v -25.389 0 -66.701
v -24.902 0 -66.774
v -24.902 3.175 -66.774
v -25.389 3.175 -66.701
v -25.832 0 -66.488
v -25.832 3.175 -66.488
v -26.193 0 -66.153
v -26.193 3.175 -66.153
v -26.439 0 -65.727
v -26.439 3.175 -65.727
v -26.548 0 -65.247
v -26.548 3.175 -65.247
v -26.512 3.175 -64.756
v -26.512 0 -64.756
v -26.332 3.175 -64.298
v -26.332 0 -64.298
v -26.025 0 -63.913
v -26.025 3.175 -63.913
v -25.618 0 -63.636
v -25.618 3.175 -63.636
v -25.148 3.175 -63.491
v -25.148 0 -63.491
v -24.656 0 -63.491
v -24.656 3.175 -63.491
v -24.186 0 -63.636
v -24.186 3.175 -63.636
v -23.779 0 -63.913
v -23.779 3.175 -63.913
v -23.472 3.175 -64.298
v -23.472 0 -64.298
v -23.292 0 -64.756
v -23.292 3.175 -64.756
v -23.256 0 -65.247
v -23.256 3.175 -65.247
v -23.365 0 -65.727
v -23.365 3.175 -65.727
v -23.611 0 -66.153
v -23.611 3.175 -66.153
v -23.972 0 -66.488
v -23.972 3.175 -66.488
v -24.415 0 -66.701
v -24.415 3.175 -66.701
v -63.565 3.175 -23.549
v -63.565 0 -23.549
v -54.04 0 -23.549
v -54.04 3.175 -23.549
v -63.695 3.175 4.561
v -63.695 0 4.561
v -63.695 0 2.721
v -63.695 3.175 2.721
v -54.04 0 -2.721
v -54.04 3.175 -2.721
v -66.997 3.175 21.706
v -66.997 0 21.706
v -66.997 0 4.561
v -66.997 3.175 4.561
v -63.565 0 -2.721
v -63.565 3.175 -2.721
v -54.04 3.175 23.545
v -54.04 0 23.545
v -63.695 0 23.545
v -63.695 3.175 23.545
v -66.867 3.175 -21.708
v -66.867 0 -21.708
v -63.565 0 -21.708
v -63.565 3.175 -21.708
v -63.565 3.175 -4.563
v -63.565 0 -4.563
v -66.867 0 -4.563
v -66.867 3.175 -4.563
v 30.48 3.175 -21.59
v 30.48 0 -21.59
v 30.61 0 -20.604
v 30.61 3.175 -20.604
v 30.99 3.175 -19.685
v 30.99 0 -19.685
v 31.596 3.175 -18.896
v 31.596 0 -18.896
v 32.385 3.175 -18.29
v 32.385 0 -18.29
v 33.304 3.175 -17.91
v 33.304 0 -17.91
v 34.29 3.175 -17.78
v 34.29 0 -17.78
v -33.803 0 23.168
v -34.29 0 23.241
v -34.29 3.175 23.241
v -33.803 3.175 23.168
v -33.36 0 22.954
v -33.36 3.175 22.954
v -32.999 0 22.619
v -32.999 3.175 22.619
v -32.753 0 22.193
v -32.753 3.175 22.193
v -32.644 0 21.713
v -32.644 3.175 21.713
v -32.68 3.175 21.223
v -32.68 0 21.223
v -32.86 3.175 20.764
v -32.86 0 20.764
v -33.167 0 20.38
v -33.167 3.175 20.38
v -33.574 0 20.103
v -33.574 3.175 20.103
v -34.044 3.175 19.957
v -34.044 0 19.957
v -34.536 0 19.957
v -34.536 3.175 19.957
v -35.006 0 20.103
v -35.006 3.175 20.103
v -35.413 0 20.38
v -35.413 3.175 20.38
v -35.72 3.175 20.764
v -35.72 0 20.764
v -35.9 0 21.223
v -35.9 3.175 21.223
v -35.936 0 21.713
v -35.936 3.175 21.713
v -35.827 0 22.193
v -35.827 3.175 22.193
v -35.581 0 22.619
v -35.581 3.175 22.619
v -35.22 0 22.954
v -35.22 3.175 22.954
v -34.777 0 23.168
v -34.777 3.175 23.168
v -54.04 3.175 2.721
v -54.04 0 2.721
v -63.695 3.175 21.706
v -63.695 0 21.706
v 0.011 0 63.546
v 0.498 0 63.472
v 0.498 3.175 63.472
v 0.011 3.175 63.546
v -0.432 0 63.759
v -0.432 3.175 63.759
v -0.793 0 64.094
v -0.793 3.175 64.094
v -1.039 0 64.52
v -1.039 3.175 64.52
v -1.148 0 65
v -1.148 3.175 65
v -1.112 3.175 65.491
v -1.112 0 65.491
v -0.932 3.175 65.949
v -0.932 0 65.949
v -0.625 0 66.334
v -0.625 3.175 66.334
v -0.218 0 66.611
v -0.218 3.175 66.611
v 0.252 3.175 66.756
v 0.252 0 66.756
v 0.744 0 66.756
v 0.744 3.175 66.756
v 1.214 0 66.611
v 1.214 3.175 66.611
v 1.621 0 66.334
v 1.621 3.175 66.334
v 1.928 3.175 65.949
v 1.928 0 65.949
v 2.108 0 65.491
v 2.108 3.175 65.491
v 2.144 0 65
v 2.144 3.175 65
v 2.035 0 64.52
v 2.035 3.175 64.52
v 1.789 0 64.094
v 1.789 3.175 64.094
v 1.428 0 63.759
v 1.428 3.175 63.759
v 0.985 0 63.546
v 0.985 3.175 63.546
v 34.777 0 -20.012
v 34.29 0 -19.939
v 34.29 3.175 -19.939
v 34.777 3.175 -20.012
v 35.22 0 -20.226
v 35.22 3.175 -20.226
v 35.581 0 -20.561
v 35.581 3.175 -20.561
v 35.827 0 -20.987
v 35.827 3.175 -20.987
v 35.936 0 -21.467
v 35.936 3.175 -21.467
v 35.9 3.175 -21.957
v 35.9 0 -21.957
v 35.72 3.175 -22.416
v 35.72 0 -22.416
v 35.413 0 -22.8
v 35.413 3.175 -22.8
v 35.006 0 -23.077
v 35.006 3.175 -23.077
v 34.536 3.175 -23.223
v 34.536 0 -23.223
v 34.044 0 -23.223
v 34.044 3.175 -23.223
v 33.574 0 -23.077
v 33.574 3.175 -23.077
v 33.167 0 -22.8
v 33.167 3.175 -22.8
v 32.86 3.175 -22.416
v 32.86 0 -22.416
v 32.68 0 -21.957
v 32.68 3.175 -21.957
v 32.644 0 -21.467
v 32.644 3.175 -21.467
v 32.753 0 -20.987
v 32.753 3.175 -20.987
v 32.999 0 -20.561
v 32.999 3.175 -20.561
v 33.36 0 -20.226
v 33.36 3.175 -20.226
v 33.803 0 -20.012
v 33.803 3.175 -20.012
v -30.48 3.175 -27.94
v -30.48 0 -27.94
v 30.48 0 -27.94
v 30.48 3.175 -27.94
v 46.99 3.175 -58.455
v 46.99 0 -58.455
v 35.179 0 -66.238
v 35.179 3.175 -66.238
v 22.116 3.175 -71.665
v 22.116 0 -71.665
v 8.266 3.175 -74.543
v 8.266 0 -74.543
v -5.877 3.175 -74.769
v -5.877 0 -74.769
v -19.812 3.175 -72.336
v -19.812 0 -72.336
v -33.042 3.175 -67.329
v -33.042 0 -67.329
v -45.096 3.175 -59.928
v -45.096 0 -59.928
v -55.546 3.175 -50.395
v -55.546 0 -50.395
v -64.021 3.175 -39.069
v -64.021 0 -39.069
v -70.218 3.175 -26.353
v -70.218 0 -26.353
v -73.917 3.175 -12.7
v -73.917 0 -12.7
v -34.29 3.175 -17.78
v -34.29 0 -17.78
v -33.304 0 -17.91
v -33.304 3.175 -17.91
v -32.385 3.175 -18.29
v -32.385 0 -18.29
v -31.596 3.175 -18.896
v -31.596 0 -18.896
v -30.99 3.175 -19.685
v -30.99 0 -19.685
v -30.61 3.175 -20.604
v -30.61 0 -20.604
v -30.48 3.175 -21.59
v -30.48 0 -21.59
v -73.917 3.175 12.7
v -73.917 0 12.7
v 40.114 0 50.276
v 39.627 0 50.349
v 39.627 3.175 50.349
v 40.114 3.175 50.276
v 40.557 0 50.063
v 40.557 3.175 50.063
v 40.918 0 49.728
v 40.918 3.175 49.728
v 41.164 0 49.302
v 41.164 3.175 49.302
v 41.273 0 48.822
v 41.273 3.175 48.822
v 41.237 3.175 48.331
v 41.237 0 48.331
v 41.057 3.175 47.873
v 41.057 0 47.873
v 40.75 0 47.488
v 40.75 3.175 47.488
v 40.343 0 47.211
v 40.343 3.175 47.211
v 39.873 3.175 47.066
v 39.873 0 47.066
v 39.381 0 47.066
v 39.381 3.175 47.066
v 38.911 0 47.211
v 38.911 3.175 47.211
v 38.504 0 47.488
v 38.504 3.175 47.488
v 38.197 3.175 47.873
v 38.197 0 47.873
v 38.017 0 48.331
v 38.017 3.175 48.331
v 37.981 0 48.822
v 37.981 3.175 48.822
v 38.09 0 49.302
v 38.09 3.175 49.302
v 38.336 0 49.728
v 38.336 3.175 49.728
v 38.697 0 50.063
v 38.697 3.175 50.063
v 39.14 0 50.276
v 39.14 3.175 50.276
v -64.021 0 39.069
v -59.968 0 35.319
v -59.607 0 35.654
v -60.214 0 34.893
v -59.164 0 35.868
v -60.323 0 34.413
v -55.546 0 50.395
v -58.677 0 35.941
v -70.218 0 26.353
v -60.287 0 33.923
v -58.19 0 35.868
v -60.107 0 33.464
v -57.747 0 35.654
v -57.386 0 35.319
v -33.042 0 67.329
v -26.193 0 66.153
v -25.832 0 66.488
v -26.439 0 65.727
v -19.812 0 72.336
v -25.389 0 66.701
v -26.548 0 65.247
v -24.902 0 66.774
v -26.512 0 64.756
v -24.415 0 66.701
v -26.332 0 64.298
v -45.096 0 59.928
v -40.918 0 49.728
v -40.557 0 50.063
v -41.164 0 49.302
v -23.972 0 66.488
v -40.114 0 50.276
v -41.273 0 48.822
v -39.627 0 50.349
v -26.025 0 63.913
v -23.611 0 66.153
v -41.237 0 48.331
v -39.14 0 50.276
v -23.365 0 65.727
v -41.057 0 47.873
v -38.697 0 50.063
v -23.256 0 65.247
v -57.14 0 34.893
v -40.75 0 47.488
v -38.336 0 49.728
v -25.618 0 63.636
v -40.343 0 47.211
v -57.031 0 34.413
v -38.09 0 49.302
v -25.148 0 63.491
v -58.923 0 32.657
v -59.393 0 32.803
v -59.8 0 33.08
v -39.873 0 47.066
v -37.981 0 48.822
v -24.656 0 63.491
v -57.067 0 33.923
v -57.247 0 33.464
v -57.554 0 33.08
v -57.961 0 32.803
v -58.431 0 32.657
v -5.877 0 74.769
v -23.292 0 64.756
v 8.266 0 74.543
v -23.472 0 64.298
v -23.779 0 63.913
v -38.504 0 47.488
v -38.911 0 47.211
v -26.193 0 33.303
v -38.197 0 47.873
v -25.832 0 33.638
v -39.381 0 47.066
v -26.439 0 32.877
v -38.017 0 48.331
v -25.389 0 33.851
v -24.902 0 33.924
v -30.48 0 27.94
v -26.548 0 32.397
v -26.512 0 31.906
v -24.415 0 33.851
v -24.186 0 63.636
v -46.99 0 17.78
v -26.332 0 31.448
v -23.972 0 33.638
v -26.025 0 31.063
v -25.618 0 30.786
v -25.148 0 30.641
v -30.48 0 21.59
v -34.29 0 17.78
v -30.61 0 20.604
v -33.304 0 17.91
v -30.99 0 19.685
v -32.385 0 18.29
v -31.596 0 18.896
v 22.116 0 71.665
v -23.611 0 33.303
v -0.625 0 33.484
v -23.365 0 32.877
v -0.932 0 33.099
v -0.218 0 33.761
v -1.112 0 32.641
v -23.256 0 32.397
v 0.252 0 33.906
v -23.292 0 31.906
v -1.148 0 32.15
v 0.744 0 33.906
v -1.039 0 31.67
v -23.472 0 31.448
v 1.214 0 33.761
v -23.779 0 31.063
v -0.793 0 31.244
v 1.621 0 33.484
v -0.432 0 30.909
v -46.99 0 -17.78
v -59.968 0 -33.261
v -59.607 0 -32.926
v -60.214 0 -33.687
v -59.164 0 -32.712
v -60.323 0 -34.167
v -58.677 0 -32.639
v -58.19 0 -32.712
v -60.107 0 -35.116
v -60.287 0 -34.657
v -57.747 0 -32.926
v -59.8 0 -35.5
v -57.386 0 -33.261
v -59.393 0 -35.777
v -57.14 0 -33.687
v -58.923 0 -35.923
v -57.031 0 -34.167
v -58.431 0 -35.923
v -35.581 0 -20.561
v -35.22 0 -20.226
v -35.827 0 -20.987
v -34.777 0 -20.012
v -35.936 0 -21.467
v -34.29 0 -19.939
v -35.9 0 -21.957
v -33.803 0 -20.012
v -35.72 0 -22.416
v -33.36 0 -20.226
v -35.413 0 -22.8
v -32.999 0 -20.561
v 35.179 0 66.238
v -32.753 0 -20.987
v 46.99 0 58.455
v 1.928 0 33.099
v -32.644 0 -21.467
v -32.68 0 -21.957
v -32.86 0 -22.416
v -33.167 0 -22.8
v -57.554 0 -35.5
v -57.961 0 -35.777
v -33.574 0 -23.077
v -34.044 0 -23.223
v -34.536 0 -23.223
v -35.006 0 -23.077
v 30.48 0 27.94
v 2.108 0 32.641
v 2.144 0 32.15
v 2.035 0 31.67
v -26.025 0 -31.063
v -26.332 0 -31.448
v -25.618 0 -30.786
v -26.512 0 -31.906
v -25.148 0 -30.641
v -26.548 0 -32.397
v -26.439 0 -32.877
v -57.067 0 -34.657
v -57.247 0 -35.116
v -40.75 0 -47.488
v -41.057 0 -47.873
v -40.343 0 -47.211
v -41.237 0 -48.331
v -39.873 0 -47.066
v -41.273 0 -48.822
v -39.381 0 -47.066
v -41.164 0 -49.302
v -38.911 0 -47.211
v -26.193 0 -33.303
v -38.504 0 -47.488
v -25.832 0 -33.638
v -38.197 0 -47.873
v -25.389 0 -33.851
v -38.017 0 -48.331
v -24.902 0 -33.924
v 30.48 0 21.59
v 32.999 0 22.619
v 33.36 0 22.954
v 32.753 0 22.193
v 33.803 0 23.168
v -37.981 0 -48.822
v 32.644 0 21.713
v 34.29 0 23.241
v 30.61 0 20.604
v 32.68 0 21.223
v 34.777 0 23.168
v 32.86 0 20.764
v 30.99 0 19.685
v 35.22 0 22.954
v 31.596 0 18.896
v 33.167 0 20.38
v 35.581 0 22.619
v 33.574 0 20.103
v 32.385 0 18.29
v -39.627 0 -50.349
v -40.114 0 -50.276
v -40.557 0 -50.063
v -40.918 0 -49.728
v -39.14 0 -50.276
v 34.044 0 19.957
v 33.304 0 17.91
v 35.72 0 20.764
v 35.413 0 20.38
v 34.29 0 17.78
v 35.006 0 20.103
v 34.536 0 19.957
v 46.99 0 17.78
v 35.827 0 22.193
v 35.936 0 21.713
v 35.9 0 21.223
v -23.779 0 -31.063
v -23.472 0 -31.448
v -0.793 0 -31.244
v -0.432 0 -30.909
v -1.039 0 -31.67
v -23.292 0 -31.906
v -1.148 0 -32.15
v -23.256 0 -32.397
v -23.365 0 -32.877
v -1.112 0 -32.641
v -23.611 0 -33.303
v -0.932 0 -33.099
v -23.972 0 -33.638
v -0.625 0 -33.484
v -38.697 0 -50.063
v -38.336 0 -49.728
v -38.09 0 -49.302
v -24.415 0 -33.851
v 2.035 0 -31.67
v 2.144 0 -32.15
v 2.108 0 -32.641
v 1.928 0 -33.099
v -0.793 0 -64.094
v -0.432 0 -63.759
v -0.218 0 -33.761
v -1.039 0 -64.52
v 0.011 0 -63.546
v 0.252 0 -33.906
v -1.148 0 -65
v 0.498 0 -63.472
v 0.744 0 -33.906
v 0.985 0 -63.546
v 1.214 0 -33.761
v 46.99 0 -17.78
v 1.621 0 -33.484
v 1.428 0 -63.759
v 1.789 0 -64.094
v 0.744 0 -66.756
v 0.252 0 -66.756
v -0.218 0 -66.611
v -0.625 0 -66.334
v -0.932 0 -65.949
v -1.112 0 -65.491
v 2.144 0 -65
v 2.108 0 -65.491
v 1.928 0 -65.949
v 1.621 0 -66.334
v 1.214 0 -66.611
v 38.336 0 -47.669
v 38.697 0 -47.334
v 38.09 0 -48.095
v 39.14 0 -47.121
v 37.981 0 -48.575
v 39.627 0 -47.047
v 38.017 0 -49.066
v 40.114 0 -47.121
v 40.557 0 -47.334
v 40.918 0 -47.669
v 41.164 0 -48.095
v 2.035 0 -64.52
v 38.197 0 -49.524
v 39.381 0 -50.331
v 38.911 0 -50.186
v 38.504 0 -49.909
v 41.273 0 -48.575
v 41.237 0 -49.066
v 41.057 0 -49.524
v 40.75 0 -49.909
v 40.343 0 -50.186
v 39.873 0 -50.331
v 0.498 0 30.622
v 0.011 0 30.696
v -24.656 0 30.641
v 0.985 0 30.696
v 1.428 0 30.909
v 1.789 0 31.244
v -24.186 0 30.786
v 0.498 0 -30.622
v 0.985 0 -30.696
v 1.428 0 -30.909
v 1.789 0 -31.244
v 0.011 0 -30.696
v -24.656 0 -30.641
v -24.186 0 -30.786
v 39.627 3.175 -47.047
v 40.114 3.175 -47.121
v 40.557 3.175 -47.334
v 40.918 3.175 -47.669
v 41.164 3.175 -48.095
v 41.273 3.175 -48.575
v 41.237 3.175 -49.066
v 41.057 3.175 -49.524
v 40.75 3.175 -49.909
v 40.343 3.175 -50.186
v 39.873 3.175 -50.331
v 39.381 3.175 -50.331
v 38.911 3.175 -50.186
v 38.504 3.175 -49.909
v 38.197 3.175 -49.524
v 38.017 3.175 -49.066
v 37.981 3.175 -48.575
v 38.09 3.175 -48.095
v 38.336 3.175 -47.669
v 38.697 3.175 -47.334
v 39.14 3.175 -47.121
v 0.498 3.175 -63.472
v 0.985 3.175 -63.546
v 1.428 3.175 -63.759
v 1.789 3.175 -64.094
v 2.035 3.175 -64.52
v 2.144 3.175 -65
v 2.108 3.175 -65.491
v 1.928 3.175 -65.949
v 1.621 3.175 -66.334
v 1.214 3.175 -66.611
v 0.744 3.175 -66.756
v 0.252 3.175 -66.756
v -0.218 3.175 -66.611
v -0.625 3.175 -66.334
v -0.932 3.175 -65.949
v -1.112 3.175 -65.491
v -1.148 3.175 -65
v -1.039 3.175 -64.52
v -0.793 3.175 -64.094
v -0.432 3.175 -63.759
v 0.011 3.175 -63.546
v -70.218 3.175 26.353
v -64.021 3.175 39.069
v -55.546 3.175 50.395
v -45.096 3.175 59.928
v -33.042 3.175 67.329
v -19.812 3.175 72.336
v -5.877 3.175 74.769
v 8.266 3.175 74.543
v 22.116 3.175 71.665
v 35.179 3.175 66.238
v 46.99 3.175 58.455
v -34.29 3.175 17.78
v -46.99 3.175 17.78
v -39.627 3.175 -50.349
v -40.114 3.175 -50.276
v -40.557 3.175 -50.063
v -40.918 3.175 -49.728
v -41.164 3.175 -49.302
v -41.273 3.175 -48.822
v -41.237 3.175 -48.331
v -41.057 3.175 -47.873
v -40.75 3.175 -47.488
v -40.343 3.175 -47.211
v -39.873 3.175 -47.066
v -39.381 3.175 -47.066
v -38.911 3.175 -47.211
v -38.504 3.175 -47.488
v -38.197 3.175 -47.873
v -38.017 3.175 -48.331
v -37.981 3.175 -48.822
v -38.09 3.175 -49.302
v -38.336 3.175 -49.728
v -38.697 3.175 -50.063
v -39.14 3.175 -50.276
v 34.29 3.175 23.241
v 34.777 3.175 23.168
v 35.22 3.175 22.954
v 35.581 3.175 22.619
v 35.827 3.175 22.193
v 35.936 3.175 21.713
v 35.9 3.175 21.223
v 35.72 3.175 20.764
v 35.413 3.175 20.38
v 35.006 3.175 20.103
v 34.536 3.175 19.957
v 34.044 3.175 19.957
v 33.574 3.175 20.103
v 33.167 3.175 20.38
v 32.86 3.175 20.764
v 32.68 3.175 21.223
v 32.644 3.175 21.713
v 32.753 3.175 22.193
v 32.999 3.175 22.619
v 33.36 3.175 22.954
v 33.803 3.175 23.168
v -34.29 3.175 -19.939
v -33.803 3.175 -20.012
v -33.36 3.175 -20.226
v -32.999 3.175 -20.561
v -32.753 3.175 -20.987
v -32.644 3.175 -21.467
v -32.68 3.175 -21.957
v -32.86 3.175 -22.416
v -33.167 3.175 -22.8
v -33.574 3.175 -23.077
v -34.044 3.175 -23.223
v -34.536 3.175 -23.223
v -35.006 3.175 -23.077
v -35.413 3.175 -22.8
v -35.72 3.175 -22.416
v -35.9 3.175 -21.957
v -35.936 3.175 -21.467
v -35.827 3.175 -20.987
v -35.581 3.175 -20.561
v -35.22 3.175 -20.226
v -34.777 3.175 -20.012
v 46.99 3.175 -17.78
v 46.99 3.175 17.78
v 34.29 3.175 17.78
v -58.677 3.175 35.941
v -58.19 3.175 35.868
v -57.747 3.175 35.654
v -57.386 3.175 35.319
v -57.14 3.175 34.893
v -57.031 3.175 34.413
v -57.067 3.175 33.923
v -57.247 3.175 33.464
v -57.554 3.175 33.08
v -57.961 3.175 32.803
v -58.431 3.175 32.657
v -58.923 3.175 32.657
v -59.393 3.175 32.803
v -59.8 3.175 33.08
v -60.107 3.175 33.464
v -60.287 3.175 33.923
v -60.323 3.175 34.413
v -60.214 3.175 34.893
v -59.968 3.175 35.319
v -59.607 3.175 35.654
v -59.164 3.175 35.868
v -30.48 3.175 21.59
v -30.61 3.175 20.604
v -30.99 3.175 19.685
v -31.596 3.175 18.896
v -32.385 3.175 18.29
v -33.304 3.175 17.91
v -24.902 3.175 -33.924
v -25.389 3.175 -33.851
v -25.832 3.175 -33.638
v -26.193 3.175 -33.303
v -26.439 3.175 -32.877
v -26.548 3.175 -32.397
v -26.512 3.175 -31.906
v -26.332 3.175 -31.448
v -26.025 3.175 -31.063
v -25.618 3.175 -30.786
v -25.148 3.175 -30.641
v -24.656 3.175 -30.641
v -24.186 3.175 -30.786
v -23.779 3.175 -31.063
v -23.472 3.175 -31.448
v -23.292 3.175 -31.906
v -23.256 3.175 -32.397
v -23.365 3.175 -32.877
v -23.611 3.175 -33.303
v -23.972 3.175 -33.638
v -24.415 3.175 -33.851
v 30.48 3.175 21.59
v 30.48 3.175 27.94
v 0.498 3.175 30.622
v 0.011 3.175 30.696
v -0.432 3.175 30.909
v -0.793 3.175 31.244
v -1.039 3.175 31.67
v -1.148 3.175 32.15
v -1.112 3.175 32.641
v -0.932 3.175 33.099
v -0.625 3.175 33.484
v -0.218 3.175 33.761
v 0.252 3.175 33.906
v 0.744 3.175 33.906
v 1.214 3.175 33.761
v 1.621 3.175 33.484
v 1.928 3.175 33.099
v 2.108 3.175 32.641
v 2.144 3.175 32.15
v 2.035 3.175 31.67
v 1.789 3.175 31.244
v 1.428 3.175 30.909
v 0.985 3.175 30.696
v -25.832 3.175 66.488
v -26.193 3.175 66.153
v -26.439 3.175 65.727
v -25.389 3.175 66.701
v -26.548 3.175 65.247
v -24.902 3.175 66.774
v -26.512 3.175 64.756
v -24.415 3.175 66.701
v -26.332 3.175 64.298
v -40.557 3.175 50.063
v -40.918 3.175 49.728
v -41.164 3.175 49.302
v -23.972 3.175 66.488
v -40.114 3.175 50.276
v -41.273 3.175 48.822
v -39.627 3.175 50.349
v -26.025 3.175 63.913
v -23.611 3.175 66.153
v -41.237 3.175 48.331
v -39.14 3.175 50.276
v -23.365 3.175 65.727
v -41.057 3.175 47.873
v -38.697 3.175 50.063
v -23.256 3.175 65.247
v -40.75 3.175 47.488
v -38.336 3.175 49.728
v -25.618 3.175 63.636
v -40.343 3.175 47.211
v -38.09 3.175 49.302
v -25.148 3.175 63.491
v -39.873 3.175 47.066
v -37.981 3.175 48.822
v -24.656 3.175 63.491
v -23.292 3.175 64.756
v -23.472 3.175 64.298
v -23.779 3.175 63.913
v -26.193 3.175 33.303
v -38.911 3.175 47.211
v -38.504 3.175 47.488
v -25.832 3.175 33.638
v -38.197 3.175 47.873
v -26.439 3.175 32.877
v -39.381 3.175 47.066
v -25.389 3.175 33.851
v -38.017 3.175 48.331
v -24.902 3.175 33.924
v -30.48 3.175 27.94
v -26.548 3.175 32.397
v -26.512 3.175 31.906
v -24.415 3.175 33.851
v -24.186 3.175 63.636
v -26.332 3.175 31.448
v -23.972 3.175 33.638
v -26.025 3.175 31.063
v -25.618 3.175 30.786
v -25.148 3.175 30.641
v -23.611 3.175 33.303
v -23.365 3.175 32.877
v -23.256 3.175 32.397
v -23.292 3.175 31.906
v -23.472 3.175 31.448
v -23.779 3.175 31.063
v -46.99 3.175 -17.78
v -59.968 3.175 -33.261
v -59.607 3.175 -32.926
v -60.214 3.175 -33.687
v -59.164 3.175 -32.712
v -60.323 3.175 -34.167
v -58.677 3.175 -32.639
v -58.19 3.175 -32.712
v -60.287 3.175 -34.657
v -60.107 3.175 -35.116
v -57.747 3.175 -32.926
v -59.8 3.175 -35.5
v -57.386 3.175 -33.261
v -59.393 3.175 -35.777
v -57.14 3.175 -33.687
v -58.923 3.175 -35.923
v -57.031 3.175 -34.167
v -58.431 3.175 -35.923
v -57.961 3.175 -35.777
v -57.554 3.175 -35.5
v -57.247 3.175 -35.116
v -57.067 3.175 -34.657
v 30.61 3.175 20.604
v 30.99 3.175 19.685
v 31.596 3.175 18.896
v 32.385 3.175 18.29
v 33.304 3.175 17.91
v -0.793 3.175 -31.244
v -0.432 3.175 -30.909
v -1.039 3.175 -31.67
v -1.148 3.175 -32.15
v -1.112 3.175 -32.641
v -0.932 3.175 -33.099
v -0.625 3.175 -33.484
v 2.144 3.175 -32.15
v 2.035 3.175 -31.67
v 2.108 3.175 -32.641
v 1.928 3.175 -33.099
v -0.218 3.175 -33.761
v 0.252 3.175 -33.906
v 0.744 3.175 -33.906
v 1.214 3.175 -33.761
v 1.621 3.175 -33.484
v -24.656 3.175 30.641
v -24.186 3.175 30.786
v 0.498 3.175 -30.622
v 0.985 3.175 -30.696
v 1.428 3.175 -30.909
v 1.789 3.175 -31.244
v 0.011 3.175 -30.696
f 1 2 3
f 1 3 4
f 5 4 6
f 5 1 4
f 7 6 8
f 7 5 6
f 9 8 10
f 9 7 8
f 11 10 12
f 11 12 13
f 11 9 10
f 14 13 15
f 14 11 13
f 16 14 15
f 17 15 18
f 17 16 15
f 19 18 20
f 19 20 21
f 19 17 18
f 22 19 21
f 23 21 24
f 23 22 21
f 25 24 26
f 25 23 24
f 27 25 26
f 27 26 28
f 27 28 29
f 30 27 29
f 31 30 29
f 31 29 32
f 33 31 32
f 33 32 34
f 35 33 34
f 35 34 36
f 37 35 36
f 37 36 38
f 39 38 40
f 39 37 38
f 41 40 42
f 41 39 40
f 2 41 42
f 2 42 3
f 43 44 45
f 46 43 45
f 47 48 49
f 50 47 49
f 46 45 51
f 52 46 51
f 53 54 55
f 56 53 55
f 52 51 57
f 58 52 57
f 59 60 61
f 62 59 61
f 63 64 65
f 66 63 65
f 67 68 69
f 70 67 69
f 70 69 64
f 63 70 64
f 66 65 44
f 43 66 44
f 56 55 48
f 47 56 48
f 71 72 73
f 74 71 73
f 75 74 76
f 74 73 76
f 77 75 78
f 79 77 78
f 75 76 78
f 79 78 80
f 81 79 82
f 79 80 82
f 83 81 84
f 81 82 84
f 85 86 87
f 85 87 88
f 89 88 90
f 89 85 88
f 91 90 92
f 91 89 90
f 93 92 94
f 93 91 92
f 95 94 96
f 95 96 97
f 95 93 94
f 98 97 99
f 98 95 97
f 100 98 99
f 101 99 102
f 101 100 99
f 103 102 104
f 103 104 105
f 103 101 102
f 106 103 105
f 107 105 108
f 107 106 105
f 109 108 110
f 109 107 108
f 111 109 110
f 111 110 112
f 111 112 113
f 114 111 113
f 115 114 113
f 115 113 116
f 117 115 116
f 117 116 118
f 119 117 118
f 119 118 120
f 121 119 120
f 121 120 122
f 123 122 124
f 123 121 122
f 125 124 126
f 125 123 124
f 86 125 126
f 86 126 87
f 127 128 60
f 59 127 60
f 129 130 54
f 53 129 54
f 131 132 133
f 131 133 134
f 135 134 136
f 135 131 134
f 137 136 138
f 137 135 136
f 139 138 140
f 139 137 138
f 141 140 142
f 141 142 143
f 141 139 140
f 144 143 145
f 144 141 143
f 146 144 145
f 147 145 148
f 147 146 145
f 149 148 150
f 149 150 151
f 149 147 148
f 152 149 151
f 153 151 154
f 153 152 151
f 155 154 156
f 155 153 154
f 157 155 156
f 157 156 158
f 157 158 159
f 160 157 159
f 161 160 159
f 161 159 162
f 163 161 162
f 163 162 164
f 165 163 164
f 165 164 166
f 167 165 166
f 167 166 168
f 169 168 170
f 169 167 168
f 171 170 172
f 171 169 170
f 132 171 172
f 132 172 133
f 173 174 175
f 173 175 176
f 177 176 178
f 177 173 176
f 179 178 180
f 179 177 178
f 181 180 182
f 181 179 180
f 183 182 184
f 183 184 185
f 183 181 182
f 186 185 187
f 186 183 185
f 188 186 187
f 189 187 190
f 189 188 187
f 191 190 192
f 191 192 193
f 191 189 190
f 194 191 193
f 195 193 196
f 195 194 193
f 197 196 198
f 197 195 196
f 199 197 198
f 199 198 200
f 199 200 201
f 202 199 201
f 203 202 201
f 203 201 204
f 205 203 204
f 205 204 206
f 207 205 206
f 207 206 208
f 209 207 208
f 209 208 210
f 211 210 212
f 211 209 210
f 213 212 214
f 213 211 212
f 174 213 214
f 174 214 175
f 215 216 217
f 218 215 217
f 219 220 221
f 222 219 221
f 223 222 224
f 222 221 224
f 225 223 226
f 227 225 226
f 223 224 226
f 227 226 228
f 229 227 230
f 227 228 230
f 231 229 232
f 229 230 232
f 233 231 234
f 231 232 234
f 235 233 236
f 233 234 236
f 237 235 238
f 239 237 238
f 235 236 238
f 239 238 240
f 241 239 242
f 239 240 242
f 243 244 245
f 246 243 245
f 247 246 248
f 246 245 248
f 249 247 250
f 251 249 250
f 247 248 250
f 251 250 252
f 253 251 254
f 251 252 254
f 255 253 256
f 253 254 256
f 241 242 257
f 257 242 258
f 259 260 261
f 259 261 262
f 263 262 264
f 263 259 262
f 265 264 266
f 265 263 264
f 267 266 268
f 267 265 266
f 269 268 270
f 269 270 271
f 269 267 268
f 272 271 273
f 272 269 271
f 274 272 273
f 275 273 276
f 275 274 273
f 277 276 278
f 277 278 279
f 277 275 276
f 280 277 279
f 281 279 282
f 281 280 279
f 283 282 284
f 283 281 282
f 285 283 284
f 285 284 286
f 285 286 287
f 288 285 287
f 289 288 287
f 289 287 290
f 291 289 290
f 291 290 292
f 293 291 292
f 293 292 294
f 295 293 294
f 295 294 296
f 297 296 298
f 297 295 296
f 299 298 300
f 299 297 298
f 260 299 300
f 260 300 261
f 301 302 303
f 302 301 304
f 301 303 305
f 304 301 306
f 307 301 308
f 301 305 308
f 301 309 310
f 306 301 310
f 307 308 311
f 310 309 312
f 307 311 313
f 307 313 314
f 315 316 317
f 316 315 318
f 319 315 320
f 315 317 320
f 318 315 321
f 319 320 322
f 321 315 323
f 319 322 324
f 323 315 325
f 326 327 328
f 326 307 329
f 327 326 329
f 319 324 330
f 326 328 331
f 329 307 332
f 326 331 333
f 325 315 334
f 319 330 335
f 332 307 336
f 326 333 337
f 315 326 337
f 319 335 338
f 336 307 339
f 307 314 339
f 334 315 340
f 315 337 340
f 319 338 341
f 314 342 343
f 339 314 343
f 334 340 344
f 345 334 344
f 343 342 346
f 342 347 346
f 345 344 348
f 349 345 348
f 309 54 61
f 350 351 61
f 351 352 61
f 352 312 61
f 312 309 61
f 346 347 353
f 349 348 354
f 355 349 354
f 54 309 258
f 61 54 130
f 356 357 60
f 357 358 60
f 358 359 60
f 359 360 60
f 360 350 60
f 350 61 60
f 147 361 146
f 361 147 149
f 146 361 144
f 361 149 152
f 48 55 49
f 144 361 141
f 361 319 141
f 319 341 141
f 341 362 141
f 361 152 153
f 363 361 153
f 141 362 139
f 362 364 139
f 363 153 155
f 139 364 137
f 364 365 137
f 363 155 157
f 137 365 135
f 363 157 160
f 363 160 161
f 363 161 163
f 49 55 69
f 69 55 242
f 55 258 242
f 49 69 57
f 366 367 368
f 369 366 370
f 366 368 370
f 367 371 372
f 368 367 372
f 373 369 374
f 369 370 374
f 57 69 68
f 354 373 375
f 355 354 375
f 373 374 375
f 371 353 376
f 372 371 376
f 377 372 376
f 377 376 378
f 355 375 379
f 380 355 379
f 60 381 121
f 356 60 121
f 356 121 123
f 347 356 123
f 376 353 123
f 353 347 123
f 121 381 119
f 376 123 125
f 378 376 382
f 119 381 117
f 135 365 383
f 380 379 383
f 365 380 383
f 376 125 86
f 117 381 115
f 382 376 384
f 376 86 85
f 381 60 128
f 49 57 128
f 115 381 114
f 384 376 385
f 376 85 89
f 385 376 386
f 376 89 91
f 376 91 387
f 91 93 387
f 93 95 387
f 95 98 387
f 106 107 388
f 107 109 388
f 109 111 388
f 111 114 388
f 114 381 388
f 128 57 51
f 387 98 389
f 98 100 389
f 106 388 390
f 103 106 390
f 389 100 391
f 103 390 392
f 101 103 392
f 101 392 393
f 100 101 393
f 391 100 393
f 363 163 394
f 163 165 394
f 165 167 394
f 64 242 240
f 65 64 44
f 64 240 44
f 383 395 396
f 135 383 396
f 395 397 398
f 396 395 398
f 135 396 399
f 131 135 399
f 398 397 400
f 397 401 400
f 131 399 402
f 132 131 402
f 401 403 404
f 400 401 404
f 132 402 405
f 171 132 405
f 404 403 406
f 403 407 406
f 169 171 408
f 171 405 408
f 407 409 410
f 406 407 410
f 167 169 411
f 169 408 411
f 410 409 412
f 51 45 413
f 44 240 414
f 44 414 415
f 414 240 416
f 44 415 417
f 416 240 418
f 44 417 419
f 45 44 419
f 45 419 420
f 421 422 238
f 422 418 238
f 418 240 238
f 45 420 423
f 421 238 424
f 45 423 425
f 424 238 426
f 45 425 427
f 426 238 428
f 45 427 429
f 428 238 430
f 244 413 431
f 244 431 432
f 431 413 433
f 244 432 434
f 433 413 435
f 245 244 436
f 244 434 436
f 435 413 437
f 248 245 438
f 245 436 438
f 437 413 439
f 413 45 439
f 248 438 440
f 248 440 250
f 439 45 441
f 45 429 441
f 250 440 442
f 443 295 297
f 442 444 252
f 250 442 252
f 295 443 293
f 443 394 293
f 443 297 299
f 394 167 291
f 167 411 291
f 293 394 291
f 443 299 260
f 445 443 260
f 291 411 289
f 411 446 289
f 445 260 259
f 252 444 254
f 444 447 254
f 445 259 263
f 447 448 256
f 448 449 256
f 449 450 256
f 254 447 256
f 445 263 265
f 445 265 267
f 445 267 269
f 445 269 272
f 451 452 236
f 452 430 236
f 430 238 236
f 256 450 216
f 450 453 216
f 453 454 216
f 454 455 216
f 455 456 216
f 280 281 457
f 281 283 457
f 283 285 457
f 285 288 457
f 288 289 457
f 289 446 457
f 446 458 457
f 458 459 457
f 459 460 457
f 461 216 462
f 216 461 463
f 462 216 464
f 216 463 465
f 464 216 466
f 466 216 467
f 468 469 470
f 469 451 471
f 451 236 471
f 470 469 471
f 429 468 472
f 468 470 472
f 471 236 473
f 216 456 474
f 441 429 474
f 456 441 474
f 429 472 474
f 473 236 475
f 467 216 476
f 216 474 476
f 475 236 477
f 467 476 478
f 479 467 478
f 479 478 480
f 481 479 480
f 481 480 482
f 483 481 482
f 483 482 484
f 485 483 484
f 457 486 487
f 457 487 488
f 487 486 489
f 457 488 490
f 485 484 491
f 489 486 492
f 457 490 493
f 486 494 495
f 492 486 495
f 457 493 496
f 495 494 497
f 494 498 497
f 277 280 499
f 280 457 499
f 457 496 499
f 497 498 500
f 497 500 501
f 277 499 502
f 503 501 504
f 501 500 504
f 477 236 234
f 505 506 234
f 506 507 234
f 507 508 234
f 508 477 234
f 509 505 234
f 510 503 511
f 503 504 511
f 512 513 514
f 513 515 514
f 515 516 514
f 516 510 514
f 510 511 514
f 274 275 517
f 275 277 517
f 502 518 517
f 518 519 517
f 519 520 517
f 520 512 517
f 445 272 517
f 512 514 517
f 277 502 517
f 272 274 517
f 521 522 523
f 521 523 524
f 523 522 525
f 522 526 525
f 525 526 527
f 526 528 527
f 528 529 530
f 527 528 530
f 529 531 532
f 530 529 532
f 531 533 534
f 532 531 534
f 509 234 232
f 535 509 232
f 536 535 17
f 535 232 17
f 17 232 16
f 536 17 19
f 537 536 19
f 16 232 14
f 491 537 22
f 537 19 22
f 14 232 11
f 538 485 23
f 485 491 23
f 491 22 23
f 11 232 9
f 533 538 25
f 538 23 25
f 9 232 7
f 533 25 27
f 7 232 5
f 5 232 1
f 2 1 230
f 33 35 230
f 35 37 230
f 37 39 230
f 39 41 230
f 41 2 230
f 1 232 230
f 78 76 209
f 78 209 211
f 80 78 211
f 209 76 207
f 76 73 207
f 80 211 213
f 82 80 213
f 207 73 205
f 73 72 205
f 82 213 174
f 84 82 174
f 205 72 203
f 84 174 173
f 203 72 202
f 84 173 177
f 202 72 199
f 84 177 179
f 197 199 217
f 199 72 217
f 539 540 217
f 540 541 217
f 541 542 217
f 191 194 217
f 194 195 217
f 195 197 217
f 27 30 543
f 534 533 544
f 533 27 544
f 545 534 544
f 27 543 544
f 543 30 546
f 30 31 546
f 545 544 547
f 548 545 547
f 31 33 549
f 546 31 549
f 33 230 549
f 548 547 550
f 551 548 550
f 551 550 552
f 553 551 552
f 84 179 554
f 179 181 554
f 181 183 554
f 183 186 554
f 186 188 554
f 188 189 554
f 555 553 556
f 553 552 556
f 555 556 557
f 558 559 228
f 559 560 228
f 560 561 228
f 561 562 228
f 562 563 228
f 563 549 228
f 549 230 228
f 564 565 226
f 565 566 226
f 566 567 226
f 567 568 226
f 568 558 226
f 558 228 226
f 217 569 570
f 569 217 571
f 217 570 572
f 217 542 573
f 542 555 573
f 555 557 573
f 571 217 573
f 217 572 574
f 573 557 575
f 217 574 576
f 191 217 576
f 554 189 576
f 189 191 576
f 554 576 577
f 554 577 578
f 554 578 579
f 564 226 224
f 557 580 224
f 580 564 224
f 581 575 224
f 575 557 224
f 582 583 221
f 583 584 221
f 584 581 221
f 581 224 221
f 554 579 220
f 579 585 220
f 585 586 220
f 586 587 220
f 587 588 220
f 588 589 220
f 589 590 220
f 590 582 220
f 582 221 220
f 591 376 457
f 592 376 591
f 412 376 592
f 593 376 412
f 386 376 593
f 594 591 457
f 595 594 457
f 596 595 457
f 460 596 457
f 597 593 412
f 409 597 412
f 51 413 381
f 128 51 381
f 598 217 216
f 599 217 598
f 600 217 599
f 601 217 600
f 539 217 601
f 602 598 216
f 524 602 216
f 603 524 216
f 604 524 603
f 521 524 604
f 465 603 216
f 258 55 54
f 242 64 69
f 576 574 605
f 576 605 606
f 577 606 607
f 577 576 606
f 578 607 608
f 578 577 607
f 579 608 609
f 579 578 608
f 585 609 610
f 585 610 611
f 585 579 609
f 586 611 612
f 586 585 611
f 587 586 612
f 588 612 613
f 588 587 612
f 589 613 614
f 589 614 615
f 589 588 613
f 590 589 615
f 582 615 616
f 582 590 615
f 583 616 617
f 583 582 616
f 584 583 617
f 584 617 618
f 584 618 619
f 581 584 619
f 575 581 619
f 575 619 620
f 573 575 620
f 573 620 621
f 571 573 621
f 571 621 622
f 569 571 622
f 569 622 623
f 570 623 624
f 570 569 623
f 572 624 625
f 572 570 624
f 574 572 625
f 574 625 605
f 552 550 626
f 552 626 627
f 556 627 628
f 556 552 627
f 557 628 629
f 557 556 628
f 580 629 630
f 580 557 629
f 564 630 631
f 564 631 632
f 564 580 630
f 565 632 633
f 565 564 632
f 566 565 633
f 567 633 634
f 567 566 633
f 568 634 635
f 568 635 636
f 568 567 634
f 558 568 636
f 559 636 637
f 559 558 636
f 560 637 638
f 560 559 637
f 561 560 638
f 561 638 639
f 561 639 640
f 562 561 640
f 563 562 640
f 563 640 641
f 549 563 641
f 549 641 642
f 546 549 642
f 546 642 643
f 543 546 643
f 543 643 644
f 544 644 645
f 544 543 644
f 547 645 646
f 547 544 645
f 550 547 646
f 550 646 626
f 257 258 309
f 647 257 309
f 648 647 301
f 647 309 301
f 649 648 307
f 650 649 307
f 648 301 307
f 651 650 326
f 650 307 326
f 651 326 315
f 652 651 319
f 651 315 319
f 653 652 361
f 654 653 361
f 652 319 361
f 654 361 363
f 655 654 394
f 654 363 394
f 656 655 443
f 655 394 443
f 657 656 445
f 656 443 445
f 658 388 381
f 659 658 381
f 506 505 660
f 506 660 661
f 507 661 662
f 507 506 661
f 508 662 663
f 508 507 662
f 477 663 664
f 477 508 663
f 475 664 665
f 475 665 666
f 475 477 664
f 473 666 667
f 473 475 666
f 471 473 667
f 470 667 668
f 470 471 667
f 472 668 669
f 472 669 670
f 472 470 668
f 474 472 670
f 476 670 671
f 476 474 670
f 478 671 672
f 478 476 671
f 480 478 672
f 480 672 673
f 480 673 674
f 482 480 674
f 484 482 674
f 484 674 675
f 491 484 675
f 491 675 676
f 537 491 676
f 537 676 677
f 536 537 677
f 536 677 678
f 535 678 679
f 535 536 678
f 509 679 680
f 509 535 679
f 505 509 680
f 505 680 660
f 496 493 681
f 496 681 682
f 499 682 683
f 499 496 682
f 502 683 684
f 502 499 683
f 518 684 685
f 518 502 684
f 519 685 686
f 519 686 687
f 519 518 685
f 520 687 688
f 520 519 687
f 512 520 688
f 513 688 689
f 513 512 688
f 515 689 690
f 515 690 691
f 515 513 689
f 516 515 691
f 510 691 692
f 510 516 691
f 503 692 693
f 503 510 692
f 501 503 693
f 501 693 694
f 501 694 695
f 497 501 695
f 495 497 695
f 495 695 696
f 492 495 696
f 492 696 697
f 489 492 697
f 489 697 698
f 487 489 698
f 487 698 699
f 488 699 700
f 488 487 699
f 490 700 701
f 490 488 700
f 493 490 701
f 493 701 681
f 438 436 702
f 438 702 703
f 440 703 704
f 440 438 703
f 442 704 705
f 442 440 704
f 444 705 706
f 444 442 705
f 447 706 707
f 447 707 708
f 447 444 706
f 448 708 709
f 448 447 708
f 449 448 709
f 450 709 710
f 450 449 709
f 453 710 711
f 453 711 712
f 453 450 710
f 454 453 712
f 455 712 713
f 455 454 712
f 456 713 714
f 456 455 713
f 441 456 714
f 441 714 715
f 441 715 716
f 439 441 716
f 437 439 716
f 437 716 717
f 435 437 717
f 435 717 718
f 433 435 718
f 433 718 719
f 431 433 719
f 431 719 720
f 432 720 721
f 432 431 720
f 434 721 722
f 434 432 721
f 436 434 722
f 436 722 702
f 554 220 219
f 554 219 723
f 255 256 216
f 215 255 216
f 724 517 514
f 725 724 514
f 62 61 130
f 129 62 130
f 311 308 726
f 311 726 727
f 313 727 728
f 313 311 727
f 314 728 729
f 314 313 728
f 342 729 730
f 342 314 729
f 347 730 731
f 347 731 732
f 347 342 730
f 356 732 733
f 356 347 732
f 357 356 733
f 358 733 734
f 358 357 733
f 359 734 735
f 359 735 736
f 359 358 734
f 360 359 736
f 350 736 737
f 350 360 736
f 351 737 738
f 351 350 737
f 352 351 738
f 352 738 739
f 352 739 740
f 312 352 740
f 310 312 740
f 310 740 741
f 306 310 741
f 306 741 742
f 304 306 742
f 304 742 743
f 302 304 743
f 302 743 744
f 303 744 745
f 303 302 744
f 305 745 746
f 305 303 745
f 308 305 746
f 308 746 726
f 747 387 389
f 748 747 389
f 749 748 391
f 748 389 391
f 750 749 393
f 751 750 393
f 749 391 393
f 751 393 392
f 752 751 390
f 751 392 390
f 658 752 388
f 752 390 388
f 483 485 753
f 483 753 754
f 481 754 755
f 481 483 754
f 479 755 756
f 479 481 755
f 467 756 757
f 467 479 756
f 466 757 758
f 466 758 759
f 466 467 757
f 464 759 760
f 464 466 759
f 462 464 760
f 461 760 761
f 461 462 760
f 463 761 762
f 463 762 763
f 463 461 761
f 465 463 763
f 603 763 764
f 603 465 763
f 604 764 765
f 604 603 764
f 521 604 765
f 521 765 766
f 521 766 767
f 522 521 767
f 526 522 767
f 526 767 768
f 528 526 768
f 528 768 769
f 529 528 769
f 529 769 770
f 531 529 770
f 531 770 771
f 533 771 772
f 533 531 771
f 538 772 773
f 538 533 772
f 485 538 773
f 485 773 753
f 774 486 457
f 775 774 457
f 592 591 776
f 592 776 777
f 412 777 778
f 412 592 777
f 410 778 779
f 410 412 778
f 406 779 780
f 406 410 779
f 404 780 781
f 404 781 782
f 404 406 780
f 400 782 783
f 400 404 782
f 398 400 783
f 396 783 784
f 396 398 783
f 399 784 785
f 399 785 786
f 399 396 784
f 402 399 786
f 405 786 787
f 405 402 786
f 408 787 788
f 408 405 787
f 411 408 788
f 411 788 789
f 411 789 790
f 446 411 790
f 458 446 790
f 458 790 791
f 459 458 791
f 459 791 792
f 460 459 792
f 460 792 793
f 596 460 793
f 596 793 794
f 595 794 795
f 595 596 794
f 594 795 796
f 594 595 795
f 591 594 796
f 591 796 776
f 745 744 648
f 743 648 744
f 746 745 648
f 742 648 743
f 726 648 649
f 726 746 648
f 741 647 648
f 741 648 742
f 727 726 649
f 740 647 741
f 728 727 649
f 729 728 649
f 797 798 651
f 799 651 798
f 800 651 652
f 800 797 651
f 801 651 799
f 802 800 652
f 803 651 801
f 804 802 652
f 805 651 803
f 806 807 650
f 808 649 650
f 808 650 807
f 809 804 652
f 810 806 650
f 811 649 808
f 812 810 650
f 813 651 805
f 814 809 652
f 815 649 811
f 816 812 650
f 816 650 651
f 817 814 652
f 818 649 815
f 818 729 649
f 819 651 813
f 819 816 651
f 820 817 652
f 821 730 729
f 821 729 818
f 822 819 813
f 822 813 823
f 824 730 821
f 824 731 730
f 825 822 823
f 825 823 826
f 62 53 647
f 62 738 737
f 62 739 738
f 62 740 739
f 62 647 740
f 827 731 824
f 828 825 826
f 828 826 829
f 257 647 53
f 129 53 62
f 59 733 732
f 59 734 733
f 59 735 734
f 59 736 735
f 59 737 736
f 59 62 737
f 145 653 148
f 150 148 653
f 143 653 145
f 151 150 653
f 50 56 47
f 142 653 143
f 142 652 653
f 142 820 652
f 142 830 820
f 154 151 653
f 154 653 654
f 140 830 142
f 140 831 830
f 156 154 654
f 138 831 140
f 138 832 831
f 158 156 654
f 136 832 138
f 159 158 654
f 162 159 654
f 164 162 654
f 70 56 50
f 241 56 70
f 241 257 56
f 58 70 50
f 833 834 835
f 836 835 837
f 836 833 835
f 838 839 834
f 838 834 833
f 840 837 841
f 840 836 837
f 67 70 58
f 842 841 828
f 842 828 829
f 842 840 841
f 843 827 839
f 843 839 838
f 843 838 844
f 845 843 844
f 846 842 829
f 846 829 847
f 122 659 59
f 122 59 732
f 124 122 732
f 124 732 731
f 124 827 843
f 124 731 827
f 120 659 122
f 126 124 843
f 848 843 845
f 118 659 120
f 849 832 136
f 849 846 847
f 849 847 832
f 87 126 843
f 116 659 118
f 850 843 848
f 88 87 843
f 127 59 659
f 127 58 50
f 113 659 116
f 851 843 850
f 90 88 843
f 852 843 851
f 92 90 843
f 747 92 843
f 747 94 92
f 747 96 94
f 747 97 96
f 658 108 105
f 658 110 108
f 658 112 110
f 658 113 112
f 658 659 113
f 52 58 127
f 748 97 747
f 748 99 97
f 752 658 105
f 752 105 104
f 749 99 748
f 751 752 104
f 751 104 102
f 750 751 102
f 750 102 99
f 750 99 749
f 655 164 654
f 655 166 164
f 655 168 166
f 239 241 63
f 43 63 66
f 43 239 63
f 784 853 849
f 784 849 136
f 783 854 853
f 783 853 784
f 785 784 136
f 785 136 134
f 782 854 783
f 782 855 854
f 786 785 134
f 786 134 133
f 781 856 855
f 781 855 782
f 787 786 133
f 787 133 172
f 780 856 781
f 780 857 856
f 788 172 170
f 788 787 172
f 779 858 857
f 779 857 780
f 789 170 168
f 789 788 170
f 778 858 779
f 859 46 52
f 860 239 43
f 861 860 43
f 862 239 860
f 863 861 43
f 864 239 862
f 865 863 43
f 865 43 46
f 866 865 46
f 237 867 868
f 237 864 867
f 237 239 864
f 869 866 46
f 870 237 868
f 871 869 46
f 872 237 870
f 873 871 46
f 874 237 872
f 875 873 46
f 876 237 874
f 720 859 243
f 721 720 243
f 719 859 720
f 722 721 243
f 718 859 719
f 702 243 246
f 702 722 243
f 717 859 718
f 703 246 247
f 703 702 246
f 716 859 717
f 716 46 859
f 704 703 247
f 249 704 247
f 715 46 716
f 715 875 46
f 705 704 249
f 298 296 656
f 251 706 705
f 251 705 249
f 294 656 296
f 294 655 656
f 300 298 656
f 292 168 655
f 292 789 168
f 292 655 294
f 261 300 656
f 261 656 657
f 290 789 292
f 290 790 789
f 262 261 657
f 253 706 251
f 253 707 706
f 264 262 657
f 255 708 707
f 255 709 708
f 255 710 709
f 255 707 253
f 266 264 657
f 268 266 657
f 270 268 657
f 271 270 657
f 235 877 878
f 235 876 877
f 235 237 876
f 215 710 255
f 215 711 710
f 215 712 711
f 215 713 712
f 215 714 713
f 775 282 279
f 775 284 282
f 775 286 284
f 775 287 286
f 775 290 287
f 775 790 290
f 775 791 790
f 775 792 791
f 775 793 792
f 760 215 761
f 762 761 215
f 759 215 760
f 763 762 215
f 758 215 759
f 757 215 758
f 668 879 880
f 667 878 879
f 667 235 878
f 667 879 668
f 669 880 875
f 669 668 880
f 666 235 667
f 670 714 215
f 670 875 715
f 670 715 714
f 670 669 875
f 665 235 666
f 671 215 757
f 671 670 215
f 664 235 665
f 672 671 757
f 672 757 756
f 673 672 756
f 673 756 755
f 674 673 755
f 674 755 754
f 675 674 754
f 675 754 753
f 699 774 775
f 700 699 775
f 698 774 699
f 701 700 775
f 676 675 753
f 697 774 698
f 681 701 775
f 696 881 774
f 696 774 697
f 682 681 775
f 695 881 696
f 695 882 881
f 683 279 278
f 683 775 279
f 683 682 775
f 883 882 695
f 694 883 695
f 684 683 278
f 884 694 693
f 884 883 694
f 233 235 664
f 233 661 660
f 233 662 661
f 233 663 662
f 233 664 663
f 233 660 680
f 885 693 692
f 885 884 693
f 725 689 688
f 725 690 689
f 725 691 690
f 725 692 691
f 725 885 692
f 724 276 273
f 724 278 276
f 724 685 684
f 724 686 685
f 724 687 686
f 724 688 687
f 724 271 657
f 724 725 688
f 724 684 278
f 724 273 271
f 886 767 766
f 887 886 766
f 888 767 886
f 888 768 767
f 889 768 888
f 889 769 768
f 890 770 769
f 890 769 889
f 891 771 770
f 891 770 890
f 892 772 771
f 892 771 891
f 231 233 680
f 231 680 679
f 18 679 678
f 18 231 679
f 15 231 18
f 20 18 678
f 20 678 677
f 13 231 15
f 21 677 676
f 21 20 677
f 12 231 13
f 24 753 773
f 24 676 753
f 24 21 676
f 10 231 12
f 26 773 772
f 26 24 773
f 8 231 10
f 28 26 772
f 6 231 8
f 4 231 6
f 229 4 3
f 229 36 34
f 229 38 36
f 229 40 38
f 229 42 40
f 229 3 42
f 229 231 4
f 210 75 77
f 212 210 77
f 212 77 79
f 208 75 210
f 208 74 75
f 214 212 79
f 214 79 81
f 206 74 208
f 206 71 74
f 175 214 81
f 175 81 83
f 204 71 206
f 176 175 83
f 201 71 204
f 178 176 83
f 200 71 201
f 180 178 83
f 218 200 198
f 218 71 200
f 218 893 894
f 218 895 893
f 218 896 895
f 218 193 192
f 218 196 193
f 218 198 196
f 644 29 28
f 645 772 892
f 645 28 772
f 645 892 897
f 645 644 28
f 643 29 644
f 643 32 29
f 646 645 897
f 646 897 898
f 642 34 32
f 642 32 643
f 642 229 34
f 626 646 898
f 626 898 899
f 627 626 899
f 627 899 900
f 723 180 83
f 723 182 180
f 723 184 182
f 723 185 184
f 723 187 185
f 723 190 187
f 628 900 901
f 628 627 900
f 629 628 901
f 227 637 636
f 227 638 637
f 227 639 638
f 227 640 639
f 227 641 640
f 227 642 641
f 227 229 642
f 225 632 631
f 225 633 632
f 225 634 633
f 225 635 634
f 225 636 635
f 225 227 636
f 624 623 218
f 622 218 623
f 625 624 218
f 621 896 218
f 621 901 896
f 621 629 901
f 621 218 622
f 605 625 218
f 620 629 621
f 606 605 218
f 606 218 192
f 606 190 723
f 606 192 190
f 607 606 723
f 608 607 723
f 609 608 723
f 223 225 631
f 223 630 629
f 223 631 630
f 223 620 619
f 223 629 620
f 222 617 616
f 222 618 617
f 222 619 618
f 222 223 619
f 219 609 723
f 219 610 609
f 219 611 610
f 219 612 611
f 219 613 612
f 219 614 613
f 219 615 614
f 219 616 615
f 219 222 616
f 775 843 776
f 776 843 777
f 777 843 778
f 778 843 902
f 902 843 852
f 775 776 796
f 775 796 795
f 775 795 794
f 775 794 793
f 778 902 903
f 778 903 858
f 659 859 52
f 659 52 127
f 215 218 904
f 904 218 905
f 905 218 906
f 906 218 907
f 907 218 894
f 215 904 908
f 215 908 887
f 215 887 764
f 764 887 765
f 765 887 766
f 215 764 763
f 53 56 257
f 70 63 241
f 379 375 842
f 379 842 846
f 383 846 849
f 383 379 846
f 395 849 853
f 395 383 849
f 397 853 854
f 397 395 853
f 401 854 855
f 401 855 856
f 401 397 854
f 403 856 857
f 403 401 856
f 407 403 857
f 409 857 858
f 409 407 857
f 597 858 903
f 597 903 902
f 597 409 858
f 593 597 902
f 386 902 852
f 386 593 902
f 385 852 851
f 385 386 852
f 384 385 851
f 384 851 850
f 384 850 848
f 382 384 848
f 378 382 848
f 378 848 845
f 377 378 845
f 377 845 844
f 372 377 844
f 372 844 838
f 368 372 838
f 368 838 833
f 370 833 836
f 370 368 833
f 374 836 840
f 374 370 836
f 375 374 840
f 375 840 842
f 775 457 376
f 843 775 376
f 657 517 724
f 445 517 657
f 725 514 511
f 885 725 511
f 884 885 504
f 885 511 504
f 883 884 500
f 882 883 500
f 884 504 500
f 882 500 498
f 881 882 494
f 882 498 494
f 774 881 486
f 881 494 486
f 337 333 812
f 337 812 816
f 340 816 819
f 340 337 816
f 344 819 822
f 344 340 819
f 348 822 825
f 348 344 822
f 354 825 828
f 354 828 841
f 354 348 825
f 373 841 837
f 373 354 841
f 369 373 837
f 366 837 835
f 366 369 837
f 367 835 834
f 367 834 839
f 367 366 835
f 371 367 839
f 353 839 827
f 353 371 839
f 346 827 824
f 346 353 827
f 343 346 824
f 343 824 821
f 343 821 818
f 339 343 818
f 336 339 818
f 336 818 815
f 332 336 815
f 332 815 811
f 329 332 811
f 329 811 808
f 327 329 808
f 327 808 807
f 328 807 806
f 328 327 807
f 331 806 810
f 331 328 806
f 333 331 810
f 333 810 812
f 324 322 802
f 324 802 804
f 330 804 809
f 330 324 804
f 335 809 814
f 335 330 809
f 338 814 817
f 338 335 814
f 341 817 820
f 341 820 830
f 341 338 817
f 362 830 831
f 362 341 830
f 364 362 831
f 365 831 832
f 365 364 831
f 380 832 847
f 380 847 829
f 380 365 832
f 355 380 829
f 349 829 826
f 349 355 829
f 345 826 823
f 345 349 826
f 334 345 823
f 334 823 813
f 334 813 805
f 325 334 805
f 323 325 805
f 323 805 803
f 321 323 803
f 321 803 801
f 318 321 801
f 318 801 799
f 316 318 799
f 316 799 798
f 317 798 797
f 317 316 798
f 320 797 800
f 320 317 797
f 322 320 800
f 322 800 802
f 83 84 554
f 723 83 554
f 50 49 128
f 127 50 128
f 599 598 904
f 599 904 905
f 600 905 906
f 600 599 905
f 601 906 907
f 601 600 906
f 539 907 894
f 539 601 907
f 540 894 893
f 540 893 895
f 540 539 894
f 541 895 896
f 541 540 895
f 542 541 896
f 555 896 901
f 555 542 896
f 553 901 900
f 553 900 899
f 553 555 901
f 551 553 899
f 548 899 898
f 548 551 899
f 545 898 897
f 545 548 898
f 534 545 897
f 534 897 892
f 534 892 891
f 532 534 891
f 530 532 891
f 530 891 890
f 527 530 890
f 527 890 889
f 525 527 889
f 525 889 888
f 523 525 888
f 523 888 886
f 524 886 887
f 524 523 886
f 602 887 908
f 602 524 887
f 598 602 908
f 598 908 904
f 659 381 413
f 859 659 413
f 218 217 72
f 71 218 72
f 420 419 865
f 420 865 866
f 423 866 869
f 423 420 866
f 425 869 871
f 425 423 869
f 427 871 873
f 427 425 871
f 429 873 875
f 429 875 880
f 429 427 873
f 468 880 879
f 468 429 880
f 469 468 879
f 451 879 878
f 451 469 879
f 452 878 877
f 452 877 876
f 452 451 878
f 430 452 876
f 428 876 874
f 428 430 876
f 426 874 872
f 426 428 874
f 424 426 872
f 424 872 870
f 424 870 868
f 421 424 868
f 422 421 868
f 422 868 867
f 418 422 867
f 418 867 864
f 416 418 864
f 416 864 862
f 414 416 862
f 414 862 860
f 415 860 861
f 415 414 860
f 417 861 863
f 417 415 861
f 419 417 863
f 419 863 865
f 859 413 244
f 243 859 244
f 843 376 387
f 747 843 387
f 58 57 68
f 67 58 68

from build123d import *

# Parameters (mm, degrees)
SKETCH1_R           = 1.651
BOSS_EXTRUDE1_DEPTH = 3.175
CUT_EXTRUDE1_START  = -3.175
CUT_EXTRUDE1_DEPTH  = 3.175


with BuildPart() as part:
    # Sketch1 → Boss-Extrude1 (new body)
    with BuildSketch(Plane(origin=(0, 0, 0), x_dir=(1, 0, 0), z_dir=(0, 1, 0))):
        with BuildLine():
            Line((-73.916912814, 12.7), (-73.916912814, -12.7))
            ThreePointArc((-73.916912814, -12.7), (75, 0), (-73.916912814, 12.7))
        make_face()
        with Locations(Location((-34.29, 21.59, 0), (0, 0, 270))):
            Circle(SKETCH1_R, mode=Mode.SUBTRACT)
        with Locations(Location((34.29, 21.59, 0), (0, 0, 270))):
            Circle(SKETCH1_R, mode=Mode.SUBTRACT)
        with Locations(Location((-34.29, -21.59, 0), (0, 0, 270))):
            Circle(SKETCH1_R, mode=Mode.SUBTRACT)
        with Locations(Location((34.29, -21.59, 0), (0, 0, 270))):
            Circle(SKETCH1_R, mode=Mode.SUBTRACT)
        with Locations(Location((39.626912814, -48.698461806, 0), (0, 0, 270))):
            Circle(SKETCH1_R, mode=Mode.SUBTRACT)
        with Locations(Location((-58.676912814, -34.29, 0), (0, 0, 270))):
            Circle(SKETCH1_R, mode=Mode.SUBTRACT)
        with Locations(Location((-58.676912814, 34.29, 0), (0, 0, 270))):
            Circle(SKETCH1_R, mode=Mode.SUBTRACT)
        with Locations(Location((39.626912814, 48.698461806, 0), (0, 0, 270))):
            Circle(SKETCH1_R, mode=Mode.SUBTRACT)
        with Locations(Location((0.498087186, -65.123461806, 0), (0, 0, 90))):
            Circle(SKETCH1_R, mode=Mode.SUBTRACT)
        with Locations(Location((0.498087186, -32.273461806, 0), (0, 0, 90))):
            Circle(SKETCH1_R, mode=Mode.SUBTRACT)
        with Locations(Location((0.498087186, 32.273461806, 0), (0, 0, 270))):
            Circle(SKETCH1_R, mode=Mode.SUBTRACT)
        with Locations(Location((0.498087186, 65.123461806, 0), (0, 0, 270))):
            Circle(SKETCH1_R, mode=Mode.SUBTRACT)
        with Locations(Location((-39.626912814, -48.698461806, 0), (0, 0, 270))):
            Circle(SKETCH1_R, mode=Mode.SUBTRACT)
        with Locations(Location((-24.901912814, -32.273461806, 0), (0, 0, 270))):
            Circle(SKETCH1_R, mode=Mode.SUBTRACT)
        with Locations(Location((-24.901912814, -65.123461806, 0), (0, 0, 270))):
            Circle(SKETCH1_R, mode=Mode.SUBTRACT)
        with Locations(Location((-24.901912814, 65.123461806, 0), (0, 0, 90))):
            Circle(SKETCH1_R, mode=Mode.SUBTRACT)
        with Locations(Location((-39.626912814, 48.698461806, 0), (0, 0, 90))):
            Circle(SKETCH1_R, mode=Mode.SUBTRACT)
        with Locations(Location((-24.901912814, 32.273461806, 0), (0, 0, 90))):
            Circle(SKETCH1_R, mode=Mode.SUBTRACT)
        with BuildLine():
            Line((-30.48, 27.94), (30.48, 27.94))
            Line((30.48, 27.94), (30.48, 21.59))
            ThreePointArc((30.48, 21.59), (31.595923164, 18.895923164), (34.29, 17.78))
            Line((34.29, 17.78), (46.99, 17.78))
            Line((46.99, 17.78), (46.99, -17.78))
            Line((46.99, -17.78), (34.29, -17.78))
            ThreePointArc((34.29, -17.78), (31.595923164, -18.895923164), (30.48, -21.59))
            Line((30.48, -21.59), (30.48, -27.94))
            Line((30.48, -27.94), (-30.48, -27.94))
            Line((-30.48, -27.94), (-30.48, -21.59))
            ThreePointArc((-30.48, -21.59), (-31.595923164, -18.895923164), (-34.29, -17.78))
            Line((-34.29, -17.78), (-46.99, -17.78))
            Line((-46.99, -17.78), (-46.99, 17.78))
            Line((-46.99, 17.78), (-34.29, 17.78))
            ThreePointArc((-34.29, 17.78), (-31.595923164, 18.895923164), (-30.48, 21.59))
            Line((-30.48, 21.59), (-30.48, 27.94))
        make_face(mode=Mode.SUBTRACT)
        Polygon((-66.997078327, -4.560855709), (-63.695078327, -4.560855709), (-63.695078327, -2.72123678), (-54.039956407, -2.72123678), (-54.039956407, -4.558974638), (-54.039956407, -21.70773678), (-54.039956407, -23.545474638), (-63.695078327, -23.545474638), (-63.695078327, -21.705855709), (-66.997078327, -21.705855709), align=None, mode=Mode.SUBTRACT)
        Polygon((-66.866956407, 21.70773678), (-63.564956407, 21.70773678), (-63.564956407, 23.54923678), (-54.039956407, 23.54923678), (-54.039956407, 21.70773678), (-54.039956407, 4.56273678), (-54.039956407, 2.72123678), (-63.564956407, 2.72123678), (-63.564956407, 4.56273678), (-66.866956407, 4.56273678), align=None, mode=Mode.SUBTRACT)
    extrude(amount=BOSS_EXTRUDE1_DEPTH)

    # Sketch2 → Cut-Extrude1 (cut)
    with BuildSketch(Plane(origin=(0, 3.175, 0), x_dir=(1, 0, 0), z_dir=(0, 1, 0)).offset(CUT_EXTRUDE1_START)):
        with BuildLine():
            Line((46.99, 58.454596911), (46.99, -58.454596911))
            ThreePointArc((46.99, -58.454596911), (75, 0), (46.99, 58.454596911))
        make_face()
    extrude(amount=CUT_EXTRUDE1_DEPTH, mode=Mode.SUBTRACT)


solid = part.part
